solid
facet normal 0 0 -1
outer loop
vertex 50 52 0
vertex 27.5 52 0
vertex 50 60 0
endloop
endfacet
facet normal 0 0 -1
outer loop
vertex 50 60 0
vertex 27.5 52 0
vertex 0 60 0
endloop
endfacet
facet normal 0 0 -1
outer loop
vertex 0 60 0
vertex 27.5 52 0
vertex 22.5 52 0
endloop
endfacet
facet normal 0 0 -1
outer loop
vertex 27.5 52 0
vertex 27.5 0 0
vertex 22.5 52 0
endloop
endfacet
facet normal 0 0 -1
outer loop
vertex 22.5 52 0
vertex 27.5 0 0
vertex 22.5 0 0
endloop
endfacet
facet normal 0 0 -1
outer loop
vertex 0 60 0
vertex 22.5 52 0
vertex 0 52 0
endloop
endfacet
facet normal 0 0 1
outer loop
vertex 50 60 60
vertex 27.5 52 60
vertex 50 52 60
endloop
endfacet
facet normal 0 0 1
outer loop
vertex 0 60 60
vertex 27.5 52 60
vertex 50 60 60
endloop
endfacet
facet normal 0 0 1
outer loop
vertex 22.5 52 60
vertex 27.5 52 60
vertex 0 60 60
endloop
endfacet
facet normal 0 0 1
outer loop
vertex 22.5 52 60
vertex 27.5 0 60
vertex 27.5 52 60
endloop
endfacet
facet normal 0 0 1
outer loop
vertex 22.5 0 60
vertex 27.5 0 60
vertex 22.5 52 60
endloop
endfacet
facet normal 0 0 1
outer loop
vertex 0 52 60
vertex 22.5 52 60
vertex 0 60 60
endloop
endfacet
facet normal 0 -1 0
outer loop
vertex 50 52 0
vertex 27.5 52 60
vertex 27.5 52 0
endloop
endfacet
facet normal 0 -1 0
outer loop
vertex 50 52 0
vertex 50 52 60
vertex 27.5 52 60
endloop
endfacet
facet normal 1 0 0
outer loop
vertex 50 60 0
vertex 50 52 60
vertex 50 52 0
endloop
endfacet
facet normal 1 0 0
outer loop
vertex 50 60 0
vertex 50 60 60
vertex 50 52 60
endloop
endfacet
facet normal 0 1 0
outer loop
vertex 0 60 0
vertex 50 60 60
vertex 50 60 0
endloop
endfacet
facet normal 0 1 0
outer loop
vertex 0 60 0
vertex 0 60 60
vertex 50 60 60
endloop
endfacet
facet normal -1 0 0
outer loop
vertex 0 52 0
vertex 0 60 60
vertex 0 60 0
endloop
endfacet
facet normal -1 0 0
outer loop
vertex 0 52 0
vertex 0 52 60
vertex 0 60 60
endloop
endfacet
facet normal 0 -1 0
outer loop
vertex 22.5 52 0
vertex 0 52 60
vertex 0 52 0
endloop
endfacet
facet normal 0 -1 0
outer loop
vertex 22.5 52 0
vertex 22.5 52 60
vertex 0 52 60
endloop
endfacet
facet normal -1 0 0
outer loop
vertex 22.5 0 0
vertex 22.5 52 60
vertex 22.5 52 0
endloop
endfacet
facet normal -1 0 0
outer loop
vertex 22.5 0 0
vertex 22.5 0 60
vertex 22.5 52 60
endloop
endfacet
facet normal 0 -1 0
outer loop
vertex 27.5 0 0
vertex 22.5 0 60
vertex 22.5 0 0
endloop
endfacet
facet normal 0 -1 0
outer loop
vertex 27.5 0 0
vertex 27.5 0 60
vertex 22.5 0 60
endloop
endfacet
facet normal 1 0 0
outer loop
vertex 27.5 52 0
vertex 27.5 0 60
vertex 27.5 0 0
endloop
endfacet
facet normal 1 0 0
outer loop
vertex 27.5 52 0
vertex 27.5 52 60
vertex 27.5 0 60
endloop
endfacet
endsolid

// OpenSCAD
$fn = 32;

// ----------------------------------------------------------------------
// Structural section: tee 50 x 60 mm
// ----------------------------------------------------------------------

// --- parameters (mm) ---
sec_w = 50;               // tee width, X
sec_h = 60;               // tee height, Y
flange_t = 8;             // top flange thickness
web_t = 5;                // web thickness
plate_t = 60;             // cut length, Z (extrusion height)

profile = [[22.5, 0], [27.5, 0], [27.5, 52], [50, 52], [50, 60], [0, 60], [0, 52], [22.5, 52]];  // primary outline, 8 points, counter clockwise

// --- the one profile operation ---
linear_extrude(height = plate_t) polygon(points = profile);
